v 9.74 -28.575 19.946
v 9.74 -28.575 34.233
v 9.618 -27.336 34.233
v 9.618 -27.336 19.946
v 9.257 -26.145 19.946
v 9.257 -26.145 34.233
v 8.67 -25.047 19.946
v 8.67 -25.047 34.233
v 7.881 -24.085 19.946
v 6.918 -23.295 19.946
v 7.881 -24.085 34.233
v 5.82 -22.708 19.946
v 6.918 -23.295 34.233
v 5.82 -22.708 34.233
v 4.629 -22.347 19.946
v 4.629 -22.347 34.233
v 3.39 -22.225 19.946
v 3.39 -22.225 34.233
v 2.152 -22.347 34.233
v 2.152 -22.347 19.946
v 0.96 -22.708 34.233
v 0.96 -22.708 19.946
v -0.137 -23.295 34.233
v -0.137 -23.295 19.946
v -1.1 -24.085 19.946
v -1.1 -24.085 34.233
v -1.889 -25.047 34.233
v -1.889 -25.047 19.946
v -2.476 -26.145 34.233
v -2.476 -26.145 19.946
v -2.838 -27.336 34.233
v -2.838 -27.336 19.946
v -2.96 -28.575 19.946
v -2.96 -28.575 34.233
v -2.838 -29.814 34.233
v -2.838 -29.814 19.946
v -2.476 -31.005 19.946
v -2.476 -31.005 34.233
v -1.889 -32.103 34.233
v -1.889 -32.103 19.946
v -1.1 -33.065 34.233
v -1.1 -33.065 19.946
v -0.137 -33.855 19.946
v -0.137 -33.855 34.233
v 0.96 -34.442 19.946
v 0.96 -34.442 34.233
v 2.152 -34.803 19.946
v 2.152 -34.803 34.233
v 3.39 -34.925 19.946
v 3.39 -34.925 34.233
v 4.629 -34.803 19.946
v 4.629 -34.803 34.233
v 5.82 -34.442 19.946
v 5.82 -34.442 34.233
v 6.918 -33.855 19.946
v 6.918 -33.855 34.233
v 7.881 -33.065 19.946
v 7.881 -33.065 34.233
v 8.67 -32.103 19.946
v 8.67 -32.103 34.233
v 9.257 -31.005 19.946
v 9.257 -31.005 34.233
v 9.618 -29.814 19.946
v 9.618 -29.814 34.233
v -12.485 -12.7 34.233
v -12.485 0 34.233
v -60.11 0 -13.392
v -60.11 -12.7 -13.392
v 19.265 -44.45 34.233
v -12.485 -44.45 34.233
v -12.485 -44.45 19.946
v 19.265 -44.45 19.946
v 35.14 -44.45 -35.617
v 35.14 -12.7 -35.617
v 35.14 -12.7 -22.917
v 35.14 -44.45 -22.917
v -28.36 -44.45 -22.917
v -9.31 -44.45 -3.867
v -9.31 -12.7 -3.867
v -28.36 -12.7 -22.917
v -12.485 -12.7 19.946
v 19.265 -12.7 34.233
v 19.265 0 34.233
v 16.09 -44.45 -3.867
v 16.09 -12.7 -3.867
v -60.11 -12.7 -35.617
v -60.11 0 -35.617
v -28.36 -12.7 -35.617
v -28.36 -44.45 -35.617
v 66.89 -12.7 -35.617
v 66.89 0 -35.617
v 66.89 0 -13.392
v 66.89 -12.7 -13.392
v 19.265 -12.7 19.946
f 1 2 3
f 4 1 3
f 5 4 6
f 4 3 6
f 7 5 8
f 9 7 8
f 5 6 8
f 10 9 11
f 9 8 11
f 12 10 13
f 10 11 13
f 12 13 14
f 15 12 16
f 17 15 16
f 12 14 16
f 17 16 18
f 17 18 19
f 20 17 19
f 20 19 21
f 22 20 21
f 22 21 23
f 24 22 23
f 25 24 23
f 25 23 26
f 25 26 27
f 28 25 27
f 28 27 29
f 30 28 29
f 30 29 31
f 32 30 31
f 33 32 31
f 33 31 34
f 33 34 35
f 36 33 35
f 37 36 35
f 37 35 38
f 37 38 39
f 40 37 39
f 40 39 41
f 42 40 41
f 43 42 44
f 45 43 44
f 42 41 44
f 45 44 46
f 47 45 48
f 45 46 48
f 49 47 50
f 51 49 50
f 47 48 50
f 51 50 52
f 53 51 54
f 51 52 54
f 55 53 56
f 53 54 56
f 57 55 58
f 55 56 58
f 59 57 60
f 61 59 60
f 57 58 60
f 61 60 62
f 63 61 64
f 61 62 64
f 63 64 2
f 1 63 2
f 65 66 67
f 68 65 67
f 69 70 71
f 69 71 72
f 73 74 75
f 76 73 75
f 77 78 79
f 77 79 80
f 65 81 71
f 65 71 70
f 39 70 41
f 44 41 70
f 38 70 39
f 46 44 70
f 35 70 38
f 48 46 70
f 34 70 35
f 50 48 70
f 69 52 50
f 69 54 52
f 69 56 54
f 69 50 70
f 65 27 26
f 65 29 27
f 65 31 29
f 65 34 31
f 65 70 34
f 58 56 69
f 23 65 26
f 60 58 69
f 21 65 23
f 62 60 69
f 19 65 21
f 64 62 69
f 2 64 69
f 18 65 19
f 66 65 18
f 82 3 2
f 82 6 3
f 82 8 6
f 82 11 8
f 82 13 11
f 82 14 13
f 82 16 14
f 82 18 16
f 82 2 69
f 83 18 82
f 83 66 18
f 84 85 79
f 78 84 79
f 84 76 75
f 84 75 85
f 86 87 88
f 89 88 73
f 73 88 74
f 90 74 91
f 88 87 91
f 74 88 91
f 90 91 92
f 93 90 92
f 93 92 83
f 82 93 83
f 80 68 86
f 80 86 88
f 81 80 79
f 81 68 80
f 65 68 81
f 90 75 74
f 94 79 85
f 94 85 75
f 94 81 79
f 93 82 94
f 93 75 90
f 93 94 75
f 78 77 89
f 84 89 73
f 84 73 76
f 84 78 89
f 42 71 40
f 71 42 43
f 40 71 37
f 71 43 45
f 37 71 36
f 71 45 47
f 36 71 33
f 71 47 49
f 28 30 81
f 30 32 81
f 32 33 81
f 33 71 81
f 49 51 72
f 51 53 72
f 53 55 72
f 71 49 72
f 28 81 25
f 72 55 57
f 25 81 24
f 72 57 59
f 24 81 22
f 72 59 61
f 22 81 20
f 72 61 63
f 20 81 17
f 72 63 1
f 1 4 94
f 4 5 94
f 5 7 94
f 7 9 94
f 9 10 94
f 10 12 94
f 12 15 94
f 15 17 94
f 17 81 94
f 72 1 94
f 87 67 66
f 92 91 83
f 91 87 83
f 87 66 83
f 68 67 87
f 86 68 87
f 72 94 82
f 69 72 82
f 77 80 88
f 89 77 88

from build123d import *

# Parameters (mm, degrees)
F1_DEPTH = 12.7
F0_W     = 31.75
F0_H     = 14.2875
F2_DEPTH = 44.45
F3_R     = 6.35
F4_DEPTH = 25.4


with BuildPart() as f1:
    # F0 (on Front) → F1 (new body)
    with BuildSketch(Plane.XZ):
        Polygon((-60.109556, -13.391696), (-60.109556, -35.616696), (-28.359556, -35.616696), (-28.359556, -22.916696), (-9.309556, -3.866696), (16.090444, -3.866696), (35.140444, -22.916696), (35.140444, -35.616696), (66.890444, -35.616696), (66.890444, -13.391696), (19.265444, 34.233304), (19.265444, 19.945804), (-12.484556, 19.945804), (-12.484556, 34.233304), align=None)
    extrude(amount=F1_DEPTH)

    # F0 (on Front) → F2 (join)
    with BuildSketch(Plane.XZ):
        Polygon((-28.359556, -22.916696), (-28.359556, -35.616696), (-12.484556, -35.616696), (19.265444, -35.616696), (35.140444, -35.616696), (35.140444, -22.916696), (16.090444, -3.866696), (-9.309556, -3.866696), align=None)
        with Locations((3.390444, 27.089554)):
            Rectangle(F0_W, F0_H)
    extrude(amount=F2_DEPTH)

    # F3 (on face) → F4 (cut)
    with BuildSketch(Plane.XY.offset(34.233304)):
        with Locations((3.390444, -28.575)):
            Circle(F3_R)
    extrude(amount=-F4_DEPTH, mode=Mode.SUBTRACT)


solid = f1.part
